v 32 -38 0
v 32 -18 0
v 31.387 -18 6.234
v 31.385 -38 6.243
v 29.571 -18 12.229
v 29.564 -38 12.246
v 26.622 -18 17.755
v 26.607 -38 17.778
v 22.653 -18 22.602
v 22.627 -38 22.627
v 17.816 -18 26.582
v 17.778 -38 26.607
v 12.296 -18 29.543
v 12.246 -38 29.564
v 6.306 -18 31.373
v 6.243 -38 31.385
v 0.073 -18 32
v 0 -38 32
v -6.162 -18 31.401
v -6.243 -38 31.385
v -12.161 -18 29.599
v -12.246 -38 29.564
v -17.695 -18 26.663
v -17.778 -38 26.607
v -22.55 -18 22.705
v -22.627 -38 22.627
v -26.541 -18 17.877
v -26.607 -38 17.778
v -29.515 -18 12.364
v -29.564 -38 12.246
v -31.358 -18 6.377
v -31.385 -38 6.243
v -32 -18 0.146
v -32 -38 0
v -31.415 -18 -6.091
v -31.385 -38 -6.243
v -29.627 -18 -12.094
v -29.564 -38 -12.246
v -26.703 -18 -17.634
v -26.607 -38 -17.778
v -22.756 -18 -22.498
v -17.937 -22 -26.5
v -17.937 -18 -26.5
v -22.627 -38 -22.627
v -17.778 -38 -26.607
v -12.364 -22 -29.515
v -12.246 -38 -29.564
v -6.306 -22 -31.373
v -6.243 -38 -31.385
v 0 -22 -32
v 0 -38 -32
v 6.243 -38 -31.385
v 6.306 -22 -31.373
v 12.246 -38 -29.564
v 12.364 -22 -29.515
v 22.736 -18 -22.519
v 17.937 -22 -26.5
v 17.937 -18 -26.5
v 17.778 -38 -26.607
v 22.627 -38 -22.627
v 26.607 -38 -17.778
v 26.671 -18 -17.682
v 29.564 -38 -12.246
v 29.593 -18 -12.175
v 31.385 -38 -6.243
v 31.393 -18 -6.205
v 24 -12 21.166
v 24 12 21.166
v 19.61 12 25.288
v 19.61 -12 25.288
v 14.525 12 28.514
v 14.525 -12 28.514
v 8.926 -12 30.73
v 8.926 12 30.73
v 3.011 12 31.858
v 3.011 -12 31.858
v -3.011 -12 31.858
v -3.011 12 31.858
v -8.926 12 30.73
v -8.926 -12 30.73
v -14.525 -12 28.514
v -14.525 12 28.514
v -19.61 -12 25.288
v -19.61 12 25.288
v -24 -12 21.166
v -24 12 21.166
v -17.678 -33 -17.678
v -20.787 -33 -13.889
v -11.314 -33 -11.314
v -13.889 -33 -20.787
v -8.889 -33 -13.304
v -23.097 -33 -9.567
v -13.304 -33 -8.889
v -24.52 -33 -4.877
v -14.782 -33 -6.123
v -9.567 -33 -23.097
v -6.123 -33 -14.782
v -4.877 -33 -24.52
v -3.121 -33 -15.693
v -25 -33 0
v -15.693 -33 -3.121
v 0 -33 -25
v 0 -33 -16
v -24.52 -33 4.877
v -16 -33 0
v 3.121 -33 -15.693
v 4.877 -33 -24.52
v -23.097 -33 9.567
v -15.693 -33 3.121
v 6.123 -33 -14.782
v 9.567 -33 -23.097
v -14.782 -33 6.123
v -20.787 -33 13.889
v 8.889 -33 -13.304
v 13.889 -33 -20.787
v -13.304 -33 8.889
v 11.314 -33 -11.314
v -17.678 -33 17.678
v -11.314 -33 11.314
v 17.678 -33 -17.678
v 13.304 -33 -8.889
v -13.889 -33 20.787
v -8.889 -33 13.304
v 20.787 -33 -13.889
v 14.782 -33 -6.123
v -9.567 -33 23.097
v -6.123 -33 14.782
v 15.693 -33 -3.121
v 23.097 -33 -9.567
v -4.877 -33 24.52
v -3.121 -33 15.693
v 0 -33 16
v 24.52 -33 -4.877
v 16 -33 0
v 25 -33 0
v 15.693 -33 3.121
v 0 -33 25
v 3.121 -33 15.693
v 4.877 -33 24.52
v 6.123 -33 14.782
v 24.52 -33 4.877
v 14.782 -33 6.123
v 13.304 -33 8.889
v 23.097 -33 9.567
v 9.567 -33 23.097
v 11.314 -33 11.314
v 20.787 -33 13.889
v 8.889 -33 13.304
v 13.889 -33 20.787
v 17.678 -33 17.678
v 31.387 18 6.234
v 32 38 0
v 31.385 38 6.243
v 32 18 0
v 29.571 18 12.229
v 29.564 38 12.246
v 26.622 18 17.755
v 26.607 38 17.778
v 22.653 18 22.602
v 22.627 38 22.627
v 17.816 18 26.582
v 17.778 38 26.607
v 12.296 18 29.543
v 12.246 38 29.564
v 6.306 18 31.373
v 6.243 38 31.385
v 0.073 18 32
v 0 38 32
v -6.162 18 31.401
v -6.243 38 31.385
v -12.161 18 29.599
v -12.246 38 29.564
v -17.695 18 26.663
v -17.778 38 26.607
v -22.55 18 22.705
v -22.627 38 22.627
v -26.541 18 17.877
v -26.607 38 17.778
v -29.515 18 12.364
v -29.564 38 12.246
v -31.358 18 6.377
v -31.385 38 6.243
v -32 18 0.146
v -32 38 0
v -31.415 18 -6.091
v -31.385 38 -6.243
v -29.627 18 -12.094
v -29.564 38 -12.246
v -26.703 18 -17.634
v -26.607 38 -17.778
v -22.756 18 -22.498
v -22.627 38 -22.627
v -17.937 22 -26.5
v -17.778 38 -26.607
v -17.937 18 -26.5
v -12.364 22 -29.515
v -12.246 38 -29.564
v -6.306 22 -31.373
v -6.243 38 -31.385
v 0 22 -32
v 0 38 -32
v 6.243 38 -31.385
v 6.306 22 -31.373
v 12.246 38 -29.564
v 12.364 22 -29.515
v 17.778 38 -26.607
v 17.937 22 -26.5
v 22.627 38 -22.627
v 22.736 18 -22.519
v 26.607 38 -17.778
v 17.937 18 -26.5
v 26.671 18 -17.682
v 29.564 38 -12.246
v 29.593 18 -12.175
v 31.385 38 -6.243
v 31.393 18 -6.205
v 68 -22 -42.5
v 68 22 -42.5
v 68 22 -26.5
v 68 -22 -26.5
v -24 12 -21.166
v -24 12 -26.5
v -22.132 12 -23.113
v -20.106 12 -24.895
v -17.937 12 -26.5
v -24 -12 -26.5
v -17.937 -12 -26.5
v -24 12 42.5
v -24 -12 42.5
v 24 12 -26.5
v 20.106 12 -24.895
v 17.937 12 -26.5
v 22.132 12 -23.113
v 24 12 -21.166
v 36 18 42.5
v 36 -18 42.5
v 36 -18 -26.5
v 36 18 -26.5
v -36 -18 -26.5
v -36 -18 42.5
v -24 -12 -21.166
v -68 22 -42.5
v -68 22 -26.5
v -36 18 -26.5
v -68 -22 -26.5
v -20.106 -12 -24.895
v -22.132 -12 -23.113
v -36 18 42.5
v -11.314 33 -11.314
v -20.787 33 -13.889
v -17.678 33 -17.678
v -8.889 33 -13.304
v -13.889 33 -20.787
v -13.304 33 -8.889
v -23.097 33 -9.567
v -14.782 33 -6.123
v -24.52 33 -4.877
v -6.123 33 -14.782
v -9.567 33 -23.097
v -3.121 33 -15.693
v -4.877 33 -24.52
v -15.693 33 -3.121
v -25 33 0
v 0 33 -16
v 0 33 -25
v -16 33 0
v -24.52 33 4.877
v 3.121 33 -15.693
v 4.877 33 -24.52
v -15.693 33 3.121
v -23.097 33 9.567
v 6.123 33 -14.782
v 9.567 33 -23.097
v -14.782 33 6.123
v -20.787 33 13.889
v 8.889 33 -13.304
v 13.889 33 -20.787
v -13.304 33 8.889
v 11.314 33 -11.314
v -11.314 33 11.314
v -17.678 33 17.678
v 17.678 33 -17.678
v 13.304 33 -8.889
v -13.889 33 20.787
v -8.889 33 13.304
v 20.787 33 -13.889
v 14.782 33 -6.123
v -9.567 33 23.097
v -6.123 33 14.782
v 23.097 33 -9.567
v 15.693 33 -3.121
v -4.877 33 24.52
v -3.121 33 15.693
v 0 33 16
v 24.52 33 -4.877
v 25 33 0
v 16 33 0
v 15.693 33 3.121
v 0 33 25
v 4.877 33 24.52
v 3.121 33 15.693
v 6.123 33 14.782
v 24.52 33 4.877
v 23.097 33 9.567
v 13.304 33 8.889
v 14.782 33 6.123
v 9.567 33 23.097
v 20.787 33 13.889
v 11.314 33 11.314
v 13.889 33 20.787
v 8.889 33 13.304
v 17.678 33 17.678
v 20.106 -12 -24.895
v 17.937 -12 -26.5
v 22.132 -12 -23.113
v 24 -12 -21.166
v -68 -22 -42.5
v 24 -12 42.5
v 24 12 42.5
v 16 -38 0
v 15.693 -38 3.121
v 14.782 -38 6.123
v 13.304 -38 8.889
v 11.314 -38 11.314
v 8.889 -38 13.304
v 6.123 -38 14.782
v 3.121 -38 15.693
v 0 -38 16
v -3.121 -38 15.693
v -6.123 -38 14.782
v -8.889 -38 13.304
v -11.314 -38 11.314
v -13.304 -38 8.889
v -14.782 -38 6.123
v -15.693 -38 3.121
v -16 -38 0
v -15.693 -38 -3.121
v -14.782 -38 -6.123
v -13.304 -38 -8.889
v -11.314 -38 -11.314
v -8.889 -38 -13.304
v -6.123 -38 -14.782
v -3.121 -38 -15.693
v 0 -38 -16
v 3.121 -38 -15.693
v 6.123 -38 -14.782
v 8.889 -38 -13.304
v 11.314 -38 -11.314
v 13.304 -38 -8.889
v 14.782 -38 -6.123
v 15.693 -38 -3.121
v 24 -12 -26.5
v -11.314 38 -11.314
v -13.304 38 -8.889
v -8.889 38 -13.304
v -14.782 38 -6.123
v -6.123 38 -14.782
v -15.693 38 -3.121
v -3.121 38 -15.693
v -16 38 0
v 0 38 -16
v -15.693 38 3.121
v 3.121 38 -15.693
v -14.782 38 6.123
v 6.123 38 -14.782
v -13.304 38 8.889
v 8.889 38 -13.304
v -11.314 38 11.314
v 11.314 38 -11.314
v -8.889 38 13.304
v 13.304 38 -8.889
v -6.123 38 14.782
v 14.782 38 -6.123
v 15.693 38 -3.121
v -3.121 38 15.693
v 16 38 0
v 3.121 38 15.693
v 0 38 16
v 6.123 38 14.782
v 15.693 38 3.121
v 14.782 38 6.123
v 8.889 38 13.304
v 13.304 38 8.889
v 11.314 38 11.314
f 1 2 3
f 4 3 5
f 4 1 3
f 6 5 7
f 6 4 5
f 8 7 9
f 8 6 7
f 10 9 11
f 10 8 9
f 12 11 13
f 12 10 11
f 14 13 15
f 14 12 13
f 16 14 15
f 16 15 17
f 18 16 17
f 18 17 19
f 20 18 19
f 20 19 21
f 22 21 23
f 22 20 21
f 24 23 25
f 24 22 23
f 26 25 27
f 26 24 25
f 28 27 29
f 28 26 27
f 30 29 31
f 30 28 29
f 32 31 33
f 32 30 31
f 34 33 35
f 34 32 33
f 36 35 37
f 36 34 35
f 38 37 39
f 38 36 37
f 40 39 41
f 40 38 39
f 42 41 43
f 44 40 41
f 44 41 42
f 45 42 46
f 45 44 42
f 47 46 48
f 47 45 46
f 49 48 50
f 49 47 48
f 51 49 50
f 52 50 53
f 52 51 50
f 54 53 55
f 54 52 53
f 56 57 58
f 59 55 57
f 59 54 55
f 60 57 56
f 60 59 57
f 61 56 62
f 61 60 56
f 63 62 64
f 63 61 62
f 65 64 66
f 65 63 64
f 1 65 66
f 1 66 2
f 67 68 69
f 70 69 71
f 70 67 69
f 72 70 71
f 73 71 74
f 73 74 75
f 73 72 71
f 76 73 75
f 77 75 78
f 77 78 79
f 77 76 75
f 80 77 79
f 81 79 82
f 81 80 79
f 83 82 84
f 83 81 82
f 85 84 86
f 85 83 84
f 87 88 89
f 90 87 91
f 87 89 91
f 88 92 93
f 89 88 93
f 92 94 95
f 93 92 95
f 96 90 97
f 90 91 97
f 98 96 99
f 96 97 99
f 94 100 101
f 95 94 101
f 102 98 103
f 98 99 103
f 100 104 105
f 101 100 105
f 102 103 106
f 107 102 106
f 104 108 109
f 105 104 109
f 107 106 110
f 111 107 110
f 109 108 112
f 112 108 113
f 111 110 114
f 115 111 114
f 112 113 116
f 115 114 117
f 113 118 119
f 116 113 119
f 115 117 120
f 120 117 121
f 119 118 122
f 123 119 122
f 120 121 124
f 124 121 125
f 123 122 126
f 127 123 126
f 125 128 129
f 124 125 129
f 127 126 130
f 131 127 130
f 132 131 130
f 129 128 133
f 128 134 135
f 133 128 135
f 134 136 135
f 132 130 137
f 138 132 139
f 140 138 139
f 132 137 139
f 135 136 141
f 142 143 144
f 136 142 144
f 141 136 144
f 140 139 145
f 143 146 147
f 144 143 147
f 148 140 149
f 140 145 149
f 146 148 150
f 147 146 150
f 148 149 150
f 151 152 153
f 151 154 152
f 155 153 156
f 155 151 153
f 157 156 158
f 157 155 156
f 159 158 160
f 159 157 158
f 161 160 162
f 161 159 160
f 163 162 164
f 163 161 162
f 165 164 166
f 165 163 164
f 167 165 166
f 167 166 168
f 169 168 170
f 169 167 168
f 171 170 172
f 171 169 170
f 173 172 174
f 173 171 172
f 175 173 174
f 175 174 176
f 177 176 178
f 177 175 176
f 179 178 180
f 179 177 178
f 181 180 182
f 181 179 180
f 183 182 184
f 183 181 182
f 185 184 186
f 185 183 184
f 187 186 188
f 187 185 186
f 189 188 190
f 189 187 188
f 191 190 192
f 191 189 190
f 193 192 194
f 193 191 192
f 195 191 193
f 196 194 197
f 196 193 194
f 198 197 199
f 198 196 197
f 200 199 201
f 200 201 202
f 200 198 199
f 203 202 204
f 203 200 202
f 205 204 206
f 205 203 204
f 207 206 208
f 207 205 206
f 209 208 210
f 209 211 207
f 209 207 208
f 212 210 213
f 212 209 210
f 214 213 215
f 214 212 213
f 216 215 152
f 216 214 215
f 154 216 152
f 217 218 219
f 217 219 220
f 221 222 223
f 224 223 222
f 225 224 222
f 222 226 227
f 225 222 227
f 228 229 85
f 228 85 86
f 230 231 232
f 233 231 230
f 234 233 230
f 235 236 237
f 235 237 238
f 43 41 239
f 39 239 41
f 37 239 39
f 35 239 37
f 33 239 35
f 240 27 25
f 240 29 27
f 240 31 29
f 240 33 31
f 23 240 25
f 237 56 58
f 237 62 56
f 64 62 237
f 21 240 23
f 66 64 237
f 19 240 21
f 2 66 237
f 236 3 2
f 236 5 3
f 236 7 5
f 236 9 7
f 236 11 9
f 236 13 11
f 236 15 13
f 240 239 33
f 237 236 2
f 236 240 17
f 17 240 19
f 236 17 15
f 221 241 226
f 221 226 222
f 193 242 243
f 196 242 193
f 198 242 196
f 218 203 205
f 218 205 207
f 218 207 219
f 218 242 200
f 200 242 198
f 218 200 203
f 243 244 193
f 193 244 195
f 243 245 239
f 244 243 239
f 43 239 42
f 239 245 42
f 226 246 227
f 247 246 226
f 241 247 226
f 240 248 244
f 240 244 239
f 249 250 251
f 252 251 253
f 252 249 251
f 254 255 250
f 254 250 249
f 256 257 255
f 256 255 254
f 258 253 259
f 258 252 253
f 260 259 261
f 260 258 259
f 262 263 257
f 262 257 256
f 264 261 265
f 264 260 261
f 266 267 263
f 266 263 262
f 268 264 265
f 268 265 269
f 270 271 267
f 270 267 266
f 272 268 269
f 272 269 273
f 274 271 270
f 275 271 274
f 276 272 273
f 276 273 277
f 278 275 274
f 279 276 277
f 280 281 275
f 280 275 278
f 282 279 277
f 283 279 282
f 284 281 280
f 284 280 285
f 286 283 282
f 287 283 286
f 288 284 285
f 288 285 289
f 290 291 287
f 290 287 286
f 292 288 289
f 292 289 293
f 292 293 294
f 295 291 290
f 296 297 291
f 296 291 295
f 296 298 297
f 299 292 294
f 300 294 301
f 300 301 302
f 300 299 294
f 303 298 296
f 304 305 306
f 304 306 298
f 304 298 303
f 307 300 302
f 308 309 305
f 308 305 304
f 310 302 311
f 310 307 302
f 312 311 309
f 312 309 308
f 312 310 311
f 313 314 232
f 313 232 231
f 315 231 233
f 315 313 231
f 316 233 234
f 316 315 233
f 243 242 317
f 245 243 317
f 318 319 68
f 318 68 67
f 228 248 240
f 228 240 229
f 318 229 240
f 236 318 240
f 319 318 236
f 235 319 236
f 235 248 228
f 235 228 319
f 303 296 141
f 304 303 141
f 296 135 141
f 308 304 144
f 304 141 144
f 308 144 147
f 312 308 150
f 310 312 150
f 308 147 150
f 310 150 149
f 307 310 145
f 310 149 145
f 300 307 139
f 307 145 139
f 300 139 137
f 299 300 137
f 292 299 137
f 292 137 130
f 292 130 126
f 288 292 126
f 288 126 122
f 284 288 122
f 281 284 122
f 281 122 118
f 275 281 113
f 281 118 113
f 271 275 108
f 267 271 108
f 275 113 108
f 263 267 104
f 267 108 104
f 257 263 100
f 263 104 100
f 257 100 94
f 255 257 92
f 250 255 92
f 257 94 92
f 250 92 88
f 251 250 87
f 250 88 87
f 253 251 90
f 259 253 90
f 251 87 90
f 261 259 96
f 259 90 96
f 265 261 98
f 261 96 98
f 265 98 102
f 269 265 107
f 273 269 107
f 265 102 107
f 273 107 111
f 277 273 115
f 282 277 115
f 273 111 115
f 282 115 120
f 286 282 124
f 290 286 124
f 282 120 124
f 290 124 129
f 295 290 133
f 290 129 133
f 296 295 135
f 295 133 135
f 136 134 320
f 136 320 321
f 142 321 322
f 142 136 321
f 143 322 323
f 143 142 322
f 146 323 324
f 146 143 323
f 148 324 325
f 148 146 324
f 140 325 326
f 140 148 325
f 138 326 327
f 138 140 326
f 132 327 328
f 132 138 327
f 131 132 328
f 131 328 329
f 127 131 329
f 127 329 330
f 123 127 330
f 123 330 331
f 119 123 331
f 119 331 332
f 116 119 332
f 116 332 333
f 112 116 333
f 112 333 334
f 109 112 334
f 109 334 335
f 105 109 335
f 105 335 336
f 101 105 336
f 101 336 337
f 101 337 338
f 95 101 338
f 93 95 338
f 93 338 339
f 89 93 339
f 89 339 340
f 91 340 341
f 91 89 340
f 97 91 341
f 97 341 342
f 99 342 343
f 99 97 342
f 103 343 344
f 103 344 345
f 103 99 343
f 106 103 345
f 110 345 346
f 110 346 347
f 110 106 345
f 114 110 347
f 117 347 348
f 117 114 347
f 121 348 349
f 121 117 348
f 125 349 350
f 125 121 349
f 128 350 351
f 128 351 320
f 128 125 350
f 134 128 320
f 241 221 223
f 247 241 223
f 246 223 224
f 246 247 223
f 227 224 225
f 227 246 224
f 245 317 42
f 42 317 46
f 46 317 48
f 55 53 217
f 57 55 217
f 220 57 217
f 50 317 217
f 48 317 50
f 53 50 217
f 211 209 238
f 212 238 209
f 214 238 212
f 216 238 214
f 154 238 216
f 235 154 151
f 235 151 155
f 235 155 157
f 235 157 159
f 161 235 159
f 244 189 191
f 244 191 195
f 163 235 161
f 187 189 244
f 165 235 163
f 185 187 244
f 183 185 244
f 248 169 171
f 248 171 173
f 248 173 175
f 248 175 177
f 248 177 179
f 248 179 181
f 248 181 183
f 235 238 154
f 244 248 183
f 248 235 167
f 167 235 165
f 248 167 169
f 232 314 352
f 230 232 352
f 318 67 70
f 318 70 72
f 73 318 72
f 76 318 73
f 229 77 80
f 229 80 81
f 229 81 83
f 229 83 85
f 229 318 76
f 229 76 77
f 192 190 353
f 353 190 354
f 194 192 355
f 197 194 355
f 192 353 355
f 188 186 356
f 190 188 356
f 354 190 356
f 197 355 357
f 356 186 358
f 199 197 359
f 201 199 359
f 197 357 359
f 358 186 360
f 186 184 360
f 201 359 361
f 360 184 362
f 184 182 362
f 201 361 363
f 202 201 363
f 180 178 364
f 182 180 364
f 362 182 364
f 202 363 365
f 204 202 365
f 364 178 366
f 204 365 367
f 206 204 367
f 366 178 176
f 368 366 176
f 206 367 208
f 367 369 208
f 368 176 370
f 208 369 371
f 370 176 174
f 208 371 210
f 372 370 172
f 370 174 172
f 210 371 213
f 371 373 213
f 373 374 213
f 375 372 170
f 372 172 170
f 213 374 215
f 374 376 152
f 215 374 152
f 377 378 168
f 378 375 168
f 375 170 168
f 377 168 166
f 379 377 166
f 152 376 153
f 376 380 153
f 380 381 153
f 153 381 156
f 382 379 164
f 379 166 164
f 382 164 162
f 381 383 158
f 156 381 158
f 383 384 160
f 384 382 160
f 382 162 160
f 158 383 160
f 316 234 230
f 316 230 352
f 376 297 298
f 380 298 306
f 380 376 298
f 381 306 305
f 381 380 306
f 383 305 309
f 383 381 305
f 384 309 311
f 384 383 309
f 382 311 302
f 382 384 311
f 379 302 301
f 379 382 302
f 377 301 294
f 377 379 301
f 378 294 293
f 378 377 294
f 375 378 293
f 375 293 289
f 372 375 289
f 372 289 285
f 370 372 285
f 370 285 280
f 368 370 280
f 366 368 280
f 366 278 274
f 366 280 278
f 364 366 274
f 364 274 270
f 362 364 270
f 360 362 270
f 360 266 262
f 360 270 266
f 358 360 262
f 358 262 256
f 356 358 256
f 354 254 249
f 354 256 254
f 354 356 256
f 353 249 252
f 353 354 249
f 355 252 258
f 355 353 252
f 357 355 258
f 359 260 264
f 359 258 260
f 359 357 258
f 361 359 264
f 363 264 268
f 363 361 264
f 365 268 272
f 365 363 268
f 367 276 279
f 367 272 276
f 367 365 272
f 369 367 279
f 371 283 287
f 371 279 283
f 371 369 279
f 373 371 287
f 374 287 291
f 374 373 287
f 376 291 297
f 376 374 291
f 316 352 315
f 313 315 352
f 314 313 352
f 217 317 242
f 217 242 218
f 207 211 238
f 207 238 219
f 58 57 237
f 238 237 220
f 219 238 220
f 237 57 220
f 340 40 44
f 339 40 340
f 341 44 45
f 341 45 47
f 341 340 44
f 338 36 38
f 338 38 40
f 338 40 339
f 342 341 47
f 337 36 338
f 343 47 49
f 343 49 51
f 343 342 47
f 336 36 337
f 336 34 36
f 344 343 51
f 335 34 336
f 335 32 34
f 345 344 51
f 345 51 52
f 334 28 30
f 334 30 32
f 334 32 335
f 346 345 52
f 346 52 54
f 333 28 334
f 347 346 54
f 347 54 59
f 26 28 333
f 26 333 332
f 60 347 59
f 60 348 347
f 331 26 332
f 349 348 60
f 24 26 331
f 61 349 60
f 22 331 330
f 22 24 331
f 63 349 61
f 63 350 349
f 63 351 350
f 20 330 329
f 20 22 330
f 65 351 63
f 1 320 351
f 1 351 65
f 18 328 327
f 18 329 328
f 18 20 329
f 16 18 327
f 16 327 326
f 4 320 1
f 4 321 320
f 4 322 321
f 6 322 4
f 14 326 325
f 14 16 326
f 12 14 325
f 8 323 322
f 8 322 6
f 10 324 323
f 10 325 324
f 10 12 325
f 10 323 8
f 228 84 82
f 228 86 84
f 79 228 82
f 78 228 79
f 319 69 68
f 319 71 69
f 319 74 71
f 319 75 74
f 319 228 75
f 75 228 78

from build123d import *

# Parameters (mm, degrees)
F0_R      = 32
F0_R_2    = 16
F1_DEPTH  = 38
F3_DEPTH  = 42.5
F3_FACE_R = 16
F4_DEPTH  = 56.001
F5_W      = 136
F5_H      = 44
F6_DEPTH  = 16
F7_R      = 25
F8_DEPTH  = 33


with BuildPart() as f1:
    # F0 (on Front) → F1 (new body, symmetric)
    with BuildSketch(Plane.XZ):
        Circle(F0_R)
        Circle(F0_R_2, mode=Mode.SUBTRACT)
    extrude(amount=F1_DEPTH, both=True)

    # F2 (on Top) → F3 (join, symmetric)
    with BuildSketch(Plane.XY):
        Polygon((24, 12), (0, 12), (-24, 12), (-24, -12), (24, -12), align=None)
        Polygon((0, 18), (-36, 18), (-36, -18), (36, -18), (36, 18), align=None)
        Polygon((-24, 12), (0, 12), (24, 12), (24, -12), (-24, -12), align=None, mode=Mode.SUBTRACT)
    extrude(amount=F3_DEPTH, both=True)

    # F3_face (on face) → F4 (cut, through all)
    with BuildSketch(Plane.XZ.offset(18)):
        Circle(F3_FACE_R)
    extrude(amount=-F4_DEPTH, mode=Mode.SUBTRACT)

    # F5 (on face) → F6 (join)
    with BuildSketch(Plane(origin=(0, 0, -42.5), x_dir=(1, 0, 0), z_dir=(0, 0, -1))):
        Rectangle(F5_W, F5_H)
    extrude(amount=-F6_DEPTH)

    # F7 (on Front) → F8 (cut, symmetric)
    with BuildSketch(Plane.XZ):
        Circle(F7_R)
    extrude(amount=F8_DEPTH, both=True, mode=Mode.SUBTRACT)


solid = f1.part
